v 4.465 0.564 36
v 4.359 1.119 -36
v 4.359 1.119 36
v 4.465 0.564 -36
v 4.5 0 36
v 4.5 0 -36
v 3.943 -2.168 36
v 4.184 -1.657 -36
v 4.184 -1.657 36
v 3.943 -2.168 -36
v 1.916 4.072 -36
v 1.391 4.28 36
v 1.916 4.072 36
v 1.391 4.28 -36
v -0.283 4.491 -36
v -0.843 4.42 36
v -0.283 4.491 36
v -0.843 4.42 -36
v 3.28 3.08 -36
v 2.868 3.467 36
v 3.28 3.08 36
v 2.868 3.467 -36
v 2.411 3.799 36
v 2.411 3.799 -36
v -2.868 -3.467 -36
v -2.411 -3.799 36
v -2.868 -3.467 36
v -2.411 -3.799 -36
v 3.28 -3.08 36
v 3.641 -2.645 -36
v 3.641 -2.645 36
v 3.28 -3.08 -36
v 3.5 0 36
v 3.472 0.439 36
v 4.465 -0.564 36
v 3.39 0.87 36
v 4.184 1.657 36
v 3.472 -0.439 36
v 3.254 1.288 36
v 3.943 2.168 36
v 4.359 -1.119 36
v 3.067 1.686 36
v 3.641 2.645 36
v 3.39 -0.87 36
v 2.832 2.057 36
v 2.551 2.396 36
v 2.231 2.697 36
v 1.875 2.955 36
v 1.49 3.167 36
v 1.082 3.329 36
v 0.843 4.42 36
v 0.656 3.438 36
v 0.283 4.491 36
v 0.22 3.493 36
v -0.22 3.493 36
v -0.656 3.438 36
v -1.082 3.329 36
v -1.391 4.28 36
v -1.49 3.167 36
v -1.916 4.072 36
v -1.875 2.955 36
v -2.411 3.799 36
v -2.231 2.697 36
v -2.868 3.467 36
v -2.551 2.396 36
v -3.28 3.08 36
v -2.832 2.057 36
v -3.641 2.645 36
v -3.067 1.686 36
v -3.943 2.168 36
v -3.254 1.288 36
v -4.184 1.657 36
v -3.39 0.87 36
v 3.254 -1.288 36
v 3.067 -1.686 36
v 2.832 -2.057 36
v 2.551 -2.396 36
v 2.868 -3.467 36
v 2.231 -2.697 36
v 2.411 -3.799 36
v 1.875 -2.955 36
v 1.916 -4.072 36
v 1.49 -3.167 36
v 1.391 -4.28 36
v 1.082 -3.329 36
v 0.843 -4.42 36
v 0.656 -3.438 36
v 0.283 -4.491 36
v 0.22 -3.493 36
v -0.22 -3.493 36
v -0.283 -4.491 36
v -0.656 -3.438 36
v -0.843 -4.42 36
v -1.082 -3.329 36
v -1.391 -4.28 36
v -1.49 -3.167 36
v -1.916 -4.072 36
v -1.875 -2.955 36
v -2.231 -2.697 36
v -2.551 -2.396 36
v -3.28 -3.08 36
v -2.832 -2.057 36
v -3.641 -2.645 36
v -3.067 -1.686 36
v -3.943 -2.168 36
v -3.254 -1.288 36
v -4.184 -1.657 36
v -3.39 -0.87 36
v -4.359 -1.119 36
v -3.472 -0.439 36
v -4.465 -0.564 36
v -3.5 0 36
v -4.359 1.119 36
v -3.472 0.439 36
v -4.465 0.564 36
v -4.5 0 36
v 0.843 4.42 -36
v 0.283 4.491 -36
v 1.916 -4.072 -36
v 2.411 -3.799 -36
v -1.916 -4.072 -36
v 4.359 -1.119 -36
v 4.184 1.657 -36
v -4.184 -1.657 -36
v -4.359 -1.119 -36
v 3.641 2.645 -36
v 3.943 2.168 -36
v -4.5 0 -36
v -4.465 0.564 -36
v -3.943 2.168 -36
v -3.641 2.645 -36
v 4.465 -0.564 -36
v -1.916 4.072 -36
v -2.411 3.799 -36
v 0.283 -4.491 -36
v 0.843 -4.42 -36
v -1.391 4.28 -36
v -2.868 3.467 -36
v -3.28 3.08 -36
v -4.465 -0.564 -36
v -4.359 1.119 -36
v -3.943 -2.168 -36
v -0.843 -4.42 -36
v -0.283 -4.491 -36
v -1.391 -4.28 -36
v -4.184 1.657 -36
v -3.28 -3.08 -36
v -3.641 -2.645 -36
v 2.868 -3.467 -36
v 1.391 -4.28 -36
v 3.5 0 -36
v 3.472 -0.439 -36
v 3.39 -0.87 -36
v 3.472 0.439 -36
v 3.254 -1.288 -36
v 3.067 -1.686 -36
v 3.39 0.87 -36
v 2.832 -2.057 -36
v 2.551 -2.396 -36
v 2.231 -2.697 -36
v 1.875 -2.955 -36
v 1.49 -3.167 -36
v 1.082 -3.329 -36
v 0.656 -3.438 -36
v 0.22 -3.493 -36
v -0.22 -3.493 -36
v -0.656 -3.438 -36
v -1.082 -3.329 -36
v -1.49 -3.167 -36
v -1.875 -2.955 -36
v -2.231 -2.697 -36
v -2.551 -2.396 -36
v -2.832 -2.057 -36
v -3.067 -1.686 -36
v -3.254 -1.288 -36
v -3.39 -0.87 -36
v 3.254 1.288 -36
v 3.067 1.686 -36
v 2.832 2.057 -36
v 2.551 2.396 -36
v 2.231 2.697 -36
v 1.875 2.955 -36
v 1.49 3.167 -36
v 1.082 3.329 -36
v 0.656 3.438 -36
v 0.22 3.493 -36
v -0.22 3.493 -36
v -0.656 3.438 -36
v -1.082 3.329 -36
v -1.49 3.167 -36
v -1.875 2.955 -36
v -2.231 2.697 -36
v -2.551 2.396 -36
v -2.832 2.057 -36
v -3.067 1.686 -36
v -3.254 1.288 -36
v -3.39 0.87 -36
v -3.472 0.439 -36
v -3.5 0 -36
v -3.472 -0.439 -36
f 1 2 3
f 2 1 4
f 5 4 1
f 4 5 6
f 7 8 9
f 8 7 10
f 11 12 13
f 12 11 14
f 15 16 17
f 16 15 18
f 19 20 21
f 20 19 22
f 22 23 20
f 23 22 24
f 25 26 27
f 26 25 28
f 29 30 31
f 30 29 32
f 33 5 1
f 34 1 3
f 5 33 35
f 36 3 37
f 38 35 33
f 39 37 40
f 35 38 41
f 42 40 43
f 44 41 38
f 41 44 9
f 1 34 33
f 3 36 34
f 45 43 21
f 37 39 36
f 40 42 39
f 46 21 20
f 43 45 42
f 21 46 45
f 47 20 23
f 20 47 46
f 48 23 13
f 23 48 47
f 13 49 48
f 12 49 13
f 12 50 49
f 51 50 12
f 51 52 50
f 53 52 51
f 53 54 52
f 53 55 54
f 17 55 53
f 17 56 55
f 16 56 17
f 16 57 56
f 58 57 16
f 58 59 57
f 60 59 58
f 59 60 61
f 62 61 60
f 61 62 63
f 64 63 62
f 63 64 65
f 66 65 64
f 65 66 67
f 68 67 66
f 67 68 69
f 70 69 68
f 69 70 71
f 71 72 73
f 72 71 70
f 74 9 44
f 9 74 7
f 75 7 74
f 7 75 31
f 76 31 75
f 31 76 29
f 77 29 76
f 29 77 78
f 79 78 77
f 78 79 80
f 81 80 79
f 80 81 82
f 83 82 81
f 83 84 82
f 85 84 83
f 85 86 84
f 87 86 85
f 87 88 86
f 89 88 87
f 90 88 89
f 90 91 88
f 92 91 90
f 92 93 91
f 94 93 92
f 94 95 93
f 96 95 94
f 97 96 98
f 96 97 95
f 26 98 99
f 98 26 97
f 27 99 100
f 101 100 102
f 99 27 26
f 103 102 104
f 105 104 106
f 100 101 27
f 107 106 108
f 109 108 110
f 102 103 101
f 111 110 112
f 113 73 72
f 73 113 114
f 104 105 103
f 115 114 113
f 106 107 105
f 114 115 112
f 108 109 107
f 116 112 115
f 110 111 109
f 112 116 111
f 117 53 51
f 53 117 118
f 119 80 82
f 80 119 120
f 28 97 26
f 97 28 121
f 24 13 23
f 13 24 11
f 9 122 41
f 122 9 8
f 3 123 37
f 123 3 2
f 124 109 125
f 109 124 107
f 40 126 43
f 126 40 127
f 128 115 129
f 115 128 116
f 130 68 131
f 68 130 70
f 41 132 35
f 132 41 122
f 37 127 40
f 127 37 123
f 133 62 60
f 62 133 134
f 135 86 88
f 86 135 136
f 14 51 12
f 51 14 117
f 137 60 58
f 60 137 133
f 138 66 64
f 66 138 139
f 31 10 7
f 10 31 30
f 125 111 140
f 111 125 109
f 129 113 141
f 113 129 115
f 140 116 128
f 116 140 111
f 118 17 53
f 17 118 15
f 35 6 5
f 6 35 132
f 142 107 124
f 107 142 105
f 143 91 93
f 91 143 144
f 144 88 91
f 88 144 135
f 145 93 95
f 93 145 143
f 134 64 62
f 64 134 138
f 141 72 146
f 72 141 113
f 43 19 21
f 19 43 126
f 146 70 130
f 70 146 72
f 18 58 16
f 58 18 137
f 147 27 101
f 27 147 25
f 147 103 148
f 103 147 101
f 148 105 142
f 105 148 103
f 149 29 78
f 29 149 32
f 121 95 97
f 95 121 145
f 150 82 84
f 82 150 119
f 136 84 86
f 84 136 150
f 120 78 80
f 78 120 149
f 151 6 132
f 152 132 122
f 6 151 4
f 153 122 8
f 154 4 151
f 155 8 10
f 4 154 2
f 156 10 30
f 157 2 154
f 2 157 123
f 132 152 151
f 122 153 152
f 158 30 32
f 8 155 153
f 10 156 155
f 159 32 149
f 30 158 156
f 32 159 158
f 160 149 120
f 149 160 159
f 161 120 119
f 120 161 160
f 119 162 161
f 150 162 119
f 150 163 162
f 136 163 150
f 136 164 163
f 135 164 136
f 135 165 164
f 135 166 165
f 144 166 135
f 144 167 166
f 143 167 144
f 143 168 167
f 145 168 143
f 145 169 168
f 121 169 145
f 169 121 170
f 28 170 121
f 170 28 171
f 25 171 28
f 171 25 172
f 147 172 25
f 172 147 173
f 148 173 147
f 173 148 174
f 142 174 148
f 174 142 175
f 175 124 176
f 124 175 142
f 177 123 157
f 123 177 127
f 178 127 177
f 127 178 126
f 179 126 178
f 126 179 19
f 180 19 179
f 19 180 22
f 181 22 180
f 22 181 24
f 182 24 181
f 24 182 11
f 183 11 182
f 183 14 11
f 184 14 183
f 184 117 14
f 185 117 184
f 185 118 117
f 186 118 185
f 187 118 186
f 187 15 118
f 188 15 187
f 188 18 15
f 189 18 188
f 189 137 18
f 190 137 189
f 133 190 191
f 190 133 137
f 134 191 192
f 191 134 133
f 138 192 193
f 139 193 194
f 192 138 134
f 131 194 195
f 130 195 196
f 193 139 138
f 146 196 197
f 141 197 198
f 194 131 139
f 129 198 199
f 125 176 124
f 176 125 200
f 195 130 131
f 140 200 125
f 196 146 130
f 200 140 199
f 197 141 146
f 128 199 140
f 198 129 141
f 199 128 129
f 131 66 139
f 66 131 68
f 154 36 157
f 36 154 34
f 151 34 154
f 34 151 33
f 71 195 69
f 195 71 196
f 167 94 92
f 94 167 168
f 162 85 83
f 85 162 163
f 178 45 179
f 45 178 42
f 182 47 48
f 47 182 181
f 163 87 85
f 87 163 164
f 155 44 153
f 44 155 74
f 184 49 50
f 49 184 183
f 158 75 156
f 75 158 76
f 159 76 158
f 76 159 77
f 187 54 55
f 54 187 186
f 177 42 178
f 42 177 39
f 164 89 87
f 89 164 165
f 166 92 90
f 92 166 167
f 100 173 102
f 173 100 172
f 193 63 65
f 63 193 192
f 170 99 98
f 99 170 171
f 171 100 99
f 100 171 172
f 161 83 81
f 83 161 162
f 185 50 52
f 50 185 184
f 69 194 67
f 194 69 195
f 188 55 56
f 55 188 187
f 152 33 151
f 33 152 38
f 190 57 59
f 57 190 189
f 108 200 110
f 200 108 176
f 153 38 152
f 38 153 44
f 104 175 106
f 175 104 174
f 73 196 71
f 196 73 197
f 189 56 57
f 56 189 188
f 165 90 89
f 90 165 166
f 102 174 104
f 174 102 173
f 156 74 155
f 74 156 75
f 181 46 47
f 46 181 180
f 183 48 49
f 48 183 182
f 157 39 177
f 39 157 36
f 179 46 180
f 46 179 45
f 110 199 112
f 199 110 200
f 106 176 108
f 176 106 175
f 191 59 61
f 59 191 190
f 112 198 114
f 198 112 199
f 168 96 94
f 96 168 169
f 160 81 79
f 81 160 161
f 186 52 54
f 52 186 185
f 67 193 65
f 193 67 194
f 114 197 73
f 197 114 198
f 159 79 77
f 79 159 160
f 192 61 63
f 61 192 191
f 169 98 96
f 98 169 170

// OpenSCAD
$fn = 50;


difference() {
	union() {
		translate(v = [0, 0, -36.0000000000]) {
			cylinder(h = 72, r = 4.5000000000);
		}
	}
	union() {
		translate(v = [0, 0, -100.0000000000]) {
			cylinder(h = 200, r = 3.5000000000);
		}
	}
}
